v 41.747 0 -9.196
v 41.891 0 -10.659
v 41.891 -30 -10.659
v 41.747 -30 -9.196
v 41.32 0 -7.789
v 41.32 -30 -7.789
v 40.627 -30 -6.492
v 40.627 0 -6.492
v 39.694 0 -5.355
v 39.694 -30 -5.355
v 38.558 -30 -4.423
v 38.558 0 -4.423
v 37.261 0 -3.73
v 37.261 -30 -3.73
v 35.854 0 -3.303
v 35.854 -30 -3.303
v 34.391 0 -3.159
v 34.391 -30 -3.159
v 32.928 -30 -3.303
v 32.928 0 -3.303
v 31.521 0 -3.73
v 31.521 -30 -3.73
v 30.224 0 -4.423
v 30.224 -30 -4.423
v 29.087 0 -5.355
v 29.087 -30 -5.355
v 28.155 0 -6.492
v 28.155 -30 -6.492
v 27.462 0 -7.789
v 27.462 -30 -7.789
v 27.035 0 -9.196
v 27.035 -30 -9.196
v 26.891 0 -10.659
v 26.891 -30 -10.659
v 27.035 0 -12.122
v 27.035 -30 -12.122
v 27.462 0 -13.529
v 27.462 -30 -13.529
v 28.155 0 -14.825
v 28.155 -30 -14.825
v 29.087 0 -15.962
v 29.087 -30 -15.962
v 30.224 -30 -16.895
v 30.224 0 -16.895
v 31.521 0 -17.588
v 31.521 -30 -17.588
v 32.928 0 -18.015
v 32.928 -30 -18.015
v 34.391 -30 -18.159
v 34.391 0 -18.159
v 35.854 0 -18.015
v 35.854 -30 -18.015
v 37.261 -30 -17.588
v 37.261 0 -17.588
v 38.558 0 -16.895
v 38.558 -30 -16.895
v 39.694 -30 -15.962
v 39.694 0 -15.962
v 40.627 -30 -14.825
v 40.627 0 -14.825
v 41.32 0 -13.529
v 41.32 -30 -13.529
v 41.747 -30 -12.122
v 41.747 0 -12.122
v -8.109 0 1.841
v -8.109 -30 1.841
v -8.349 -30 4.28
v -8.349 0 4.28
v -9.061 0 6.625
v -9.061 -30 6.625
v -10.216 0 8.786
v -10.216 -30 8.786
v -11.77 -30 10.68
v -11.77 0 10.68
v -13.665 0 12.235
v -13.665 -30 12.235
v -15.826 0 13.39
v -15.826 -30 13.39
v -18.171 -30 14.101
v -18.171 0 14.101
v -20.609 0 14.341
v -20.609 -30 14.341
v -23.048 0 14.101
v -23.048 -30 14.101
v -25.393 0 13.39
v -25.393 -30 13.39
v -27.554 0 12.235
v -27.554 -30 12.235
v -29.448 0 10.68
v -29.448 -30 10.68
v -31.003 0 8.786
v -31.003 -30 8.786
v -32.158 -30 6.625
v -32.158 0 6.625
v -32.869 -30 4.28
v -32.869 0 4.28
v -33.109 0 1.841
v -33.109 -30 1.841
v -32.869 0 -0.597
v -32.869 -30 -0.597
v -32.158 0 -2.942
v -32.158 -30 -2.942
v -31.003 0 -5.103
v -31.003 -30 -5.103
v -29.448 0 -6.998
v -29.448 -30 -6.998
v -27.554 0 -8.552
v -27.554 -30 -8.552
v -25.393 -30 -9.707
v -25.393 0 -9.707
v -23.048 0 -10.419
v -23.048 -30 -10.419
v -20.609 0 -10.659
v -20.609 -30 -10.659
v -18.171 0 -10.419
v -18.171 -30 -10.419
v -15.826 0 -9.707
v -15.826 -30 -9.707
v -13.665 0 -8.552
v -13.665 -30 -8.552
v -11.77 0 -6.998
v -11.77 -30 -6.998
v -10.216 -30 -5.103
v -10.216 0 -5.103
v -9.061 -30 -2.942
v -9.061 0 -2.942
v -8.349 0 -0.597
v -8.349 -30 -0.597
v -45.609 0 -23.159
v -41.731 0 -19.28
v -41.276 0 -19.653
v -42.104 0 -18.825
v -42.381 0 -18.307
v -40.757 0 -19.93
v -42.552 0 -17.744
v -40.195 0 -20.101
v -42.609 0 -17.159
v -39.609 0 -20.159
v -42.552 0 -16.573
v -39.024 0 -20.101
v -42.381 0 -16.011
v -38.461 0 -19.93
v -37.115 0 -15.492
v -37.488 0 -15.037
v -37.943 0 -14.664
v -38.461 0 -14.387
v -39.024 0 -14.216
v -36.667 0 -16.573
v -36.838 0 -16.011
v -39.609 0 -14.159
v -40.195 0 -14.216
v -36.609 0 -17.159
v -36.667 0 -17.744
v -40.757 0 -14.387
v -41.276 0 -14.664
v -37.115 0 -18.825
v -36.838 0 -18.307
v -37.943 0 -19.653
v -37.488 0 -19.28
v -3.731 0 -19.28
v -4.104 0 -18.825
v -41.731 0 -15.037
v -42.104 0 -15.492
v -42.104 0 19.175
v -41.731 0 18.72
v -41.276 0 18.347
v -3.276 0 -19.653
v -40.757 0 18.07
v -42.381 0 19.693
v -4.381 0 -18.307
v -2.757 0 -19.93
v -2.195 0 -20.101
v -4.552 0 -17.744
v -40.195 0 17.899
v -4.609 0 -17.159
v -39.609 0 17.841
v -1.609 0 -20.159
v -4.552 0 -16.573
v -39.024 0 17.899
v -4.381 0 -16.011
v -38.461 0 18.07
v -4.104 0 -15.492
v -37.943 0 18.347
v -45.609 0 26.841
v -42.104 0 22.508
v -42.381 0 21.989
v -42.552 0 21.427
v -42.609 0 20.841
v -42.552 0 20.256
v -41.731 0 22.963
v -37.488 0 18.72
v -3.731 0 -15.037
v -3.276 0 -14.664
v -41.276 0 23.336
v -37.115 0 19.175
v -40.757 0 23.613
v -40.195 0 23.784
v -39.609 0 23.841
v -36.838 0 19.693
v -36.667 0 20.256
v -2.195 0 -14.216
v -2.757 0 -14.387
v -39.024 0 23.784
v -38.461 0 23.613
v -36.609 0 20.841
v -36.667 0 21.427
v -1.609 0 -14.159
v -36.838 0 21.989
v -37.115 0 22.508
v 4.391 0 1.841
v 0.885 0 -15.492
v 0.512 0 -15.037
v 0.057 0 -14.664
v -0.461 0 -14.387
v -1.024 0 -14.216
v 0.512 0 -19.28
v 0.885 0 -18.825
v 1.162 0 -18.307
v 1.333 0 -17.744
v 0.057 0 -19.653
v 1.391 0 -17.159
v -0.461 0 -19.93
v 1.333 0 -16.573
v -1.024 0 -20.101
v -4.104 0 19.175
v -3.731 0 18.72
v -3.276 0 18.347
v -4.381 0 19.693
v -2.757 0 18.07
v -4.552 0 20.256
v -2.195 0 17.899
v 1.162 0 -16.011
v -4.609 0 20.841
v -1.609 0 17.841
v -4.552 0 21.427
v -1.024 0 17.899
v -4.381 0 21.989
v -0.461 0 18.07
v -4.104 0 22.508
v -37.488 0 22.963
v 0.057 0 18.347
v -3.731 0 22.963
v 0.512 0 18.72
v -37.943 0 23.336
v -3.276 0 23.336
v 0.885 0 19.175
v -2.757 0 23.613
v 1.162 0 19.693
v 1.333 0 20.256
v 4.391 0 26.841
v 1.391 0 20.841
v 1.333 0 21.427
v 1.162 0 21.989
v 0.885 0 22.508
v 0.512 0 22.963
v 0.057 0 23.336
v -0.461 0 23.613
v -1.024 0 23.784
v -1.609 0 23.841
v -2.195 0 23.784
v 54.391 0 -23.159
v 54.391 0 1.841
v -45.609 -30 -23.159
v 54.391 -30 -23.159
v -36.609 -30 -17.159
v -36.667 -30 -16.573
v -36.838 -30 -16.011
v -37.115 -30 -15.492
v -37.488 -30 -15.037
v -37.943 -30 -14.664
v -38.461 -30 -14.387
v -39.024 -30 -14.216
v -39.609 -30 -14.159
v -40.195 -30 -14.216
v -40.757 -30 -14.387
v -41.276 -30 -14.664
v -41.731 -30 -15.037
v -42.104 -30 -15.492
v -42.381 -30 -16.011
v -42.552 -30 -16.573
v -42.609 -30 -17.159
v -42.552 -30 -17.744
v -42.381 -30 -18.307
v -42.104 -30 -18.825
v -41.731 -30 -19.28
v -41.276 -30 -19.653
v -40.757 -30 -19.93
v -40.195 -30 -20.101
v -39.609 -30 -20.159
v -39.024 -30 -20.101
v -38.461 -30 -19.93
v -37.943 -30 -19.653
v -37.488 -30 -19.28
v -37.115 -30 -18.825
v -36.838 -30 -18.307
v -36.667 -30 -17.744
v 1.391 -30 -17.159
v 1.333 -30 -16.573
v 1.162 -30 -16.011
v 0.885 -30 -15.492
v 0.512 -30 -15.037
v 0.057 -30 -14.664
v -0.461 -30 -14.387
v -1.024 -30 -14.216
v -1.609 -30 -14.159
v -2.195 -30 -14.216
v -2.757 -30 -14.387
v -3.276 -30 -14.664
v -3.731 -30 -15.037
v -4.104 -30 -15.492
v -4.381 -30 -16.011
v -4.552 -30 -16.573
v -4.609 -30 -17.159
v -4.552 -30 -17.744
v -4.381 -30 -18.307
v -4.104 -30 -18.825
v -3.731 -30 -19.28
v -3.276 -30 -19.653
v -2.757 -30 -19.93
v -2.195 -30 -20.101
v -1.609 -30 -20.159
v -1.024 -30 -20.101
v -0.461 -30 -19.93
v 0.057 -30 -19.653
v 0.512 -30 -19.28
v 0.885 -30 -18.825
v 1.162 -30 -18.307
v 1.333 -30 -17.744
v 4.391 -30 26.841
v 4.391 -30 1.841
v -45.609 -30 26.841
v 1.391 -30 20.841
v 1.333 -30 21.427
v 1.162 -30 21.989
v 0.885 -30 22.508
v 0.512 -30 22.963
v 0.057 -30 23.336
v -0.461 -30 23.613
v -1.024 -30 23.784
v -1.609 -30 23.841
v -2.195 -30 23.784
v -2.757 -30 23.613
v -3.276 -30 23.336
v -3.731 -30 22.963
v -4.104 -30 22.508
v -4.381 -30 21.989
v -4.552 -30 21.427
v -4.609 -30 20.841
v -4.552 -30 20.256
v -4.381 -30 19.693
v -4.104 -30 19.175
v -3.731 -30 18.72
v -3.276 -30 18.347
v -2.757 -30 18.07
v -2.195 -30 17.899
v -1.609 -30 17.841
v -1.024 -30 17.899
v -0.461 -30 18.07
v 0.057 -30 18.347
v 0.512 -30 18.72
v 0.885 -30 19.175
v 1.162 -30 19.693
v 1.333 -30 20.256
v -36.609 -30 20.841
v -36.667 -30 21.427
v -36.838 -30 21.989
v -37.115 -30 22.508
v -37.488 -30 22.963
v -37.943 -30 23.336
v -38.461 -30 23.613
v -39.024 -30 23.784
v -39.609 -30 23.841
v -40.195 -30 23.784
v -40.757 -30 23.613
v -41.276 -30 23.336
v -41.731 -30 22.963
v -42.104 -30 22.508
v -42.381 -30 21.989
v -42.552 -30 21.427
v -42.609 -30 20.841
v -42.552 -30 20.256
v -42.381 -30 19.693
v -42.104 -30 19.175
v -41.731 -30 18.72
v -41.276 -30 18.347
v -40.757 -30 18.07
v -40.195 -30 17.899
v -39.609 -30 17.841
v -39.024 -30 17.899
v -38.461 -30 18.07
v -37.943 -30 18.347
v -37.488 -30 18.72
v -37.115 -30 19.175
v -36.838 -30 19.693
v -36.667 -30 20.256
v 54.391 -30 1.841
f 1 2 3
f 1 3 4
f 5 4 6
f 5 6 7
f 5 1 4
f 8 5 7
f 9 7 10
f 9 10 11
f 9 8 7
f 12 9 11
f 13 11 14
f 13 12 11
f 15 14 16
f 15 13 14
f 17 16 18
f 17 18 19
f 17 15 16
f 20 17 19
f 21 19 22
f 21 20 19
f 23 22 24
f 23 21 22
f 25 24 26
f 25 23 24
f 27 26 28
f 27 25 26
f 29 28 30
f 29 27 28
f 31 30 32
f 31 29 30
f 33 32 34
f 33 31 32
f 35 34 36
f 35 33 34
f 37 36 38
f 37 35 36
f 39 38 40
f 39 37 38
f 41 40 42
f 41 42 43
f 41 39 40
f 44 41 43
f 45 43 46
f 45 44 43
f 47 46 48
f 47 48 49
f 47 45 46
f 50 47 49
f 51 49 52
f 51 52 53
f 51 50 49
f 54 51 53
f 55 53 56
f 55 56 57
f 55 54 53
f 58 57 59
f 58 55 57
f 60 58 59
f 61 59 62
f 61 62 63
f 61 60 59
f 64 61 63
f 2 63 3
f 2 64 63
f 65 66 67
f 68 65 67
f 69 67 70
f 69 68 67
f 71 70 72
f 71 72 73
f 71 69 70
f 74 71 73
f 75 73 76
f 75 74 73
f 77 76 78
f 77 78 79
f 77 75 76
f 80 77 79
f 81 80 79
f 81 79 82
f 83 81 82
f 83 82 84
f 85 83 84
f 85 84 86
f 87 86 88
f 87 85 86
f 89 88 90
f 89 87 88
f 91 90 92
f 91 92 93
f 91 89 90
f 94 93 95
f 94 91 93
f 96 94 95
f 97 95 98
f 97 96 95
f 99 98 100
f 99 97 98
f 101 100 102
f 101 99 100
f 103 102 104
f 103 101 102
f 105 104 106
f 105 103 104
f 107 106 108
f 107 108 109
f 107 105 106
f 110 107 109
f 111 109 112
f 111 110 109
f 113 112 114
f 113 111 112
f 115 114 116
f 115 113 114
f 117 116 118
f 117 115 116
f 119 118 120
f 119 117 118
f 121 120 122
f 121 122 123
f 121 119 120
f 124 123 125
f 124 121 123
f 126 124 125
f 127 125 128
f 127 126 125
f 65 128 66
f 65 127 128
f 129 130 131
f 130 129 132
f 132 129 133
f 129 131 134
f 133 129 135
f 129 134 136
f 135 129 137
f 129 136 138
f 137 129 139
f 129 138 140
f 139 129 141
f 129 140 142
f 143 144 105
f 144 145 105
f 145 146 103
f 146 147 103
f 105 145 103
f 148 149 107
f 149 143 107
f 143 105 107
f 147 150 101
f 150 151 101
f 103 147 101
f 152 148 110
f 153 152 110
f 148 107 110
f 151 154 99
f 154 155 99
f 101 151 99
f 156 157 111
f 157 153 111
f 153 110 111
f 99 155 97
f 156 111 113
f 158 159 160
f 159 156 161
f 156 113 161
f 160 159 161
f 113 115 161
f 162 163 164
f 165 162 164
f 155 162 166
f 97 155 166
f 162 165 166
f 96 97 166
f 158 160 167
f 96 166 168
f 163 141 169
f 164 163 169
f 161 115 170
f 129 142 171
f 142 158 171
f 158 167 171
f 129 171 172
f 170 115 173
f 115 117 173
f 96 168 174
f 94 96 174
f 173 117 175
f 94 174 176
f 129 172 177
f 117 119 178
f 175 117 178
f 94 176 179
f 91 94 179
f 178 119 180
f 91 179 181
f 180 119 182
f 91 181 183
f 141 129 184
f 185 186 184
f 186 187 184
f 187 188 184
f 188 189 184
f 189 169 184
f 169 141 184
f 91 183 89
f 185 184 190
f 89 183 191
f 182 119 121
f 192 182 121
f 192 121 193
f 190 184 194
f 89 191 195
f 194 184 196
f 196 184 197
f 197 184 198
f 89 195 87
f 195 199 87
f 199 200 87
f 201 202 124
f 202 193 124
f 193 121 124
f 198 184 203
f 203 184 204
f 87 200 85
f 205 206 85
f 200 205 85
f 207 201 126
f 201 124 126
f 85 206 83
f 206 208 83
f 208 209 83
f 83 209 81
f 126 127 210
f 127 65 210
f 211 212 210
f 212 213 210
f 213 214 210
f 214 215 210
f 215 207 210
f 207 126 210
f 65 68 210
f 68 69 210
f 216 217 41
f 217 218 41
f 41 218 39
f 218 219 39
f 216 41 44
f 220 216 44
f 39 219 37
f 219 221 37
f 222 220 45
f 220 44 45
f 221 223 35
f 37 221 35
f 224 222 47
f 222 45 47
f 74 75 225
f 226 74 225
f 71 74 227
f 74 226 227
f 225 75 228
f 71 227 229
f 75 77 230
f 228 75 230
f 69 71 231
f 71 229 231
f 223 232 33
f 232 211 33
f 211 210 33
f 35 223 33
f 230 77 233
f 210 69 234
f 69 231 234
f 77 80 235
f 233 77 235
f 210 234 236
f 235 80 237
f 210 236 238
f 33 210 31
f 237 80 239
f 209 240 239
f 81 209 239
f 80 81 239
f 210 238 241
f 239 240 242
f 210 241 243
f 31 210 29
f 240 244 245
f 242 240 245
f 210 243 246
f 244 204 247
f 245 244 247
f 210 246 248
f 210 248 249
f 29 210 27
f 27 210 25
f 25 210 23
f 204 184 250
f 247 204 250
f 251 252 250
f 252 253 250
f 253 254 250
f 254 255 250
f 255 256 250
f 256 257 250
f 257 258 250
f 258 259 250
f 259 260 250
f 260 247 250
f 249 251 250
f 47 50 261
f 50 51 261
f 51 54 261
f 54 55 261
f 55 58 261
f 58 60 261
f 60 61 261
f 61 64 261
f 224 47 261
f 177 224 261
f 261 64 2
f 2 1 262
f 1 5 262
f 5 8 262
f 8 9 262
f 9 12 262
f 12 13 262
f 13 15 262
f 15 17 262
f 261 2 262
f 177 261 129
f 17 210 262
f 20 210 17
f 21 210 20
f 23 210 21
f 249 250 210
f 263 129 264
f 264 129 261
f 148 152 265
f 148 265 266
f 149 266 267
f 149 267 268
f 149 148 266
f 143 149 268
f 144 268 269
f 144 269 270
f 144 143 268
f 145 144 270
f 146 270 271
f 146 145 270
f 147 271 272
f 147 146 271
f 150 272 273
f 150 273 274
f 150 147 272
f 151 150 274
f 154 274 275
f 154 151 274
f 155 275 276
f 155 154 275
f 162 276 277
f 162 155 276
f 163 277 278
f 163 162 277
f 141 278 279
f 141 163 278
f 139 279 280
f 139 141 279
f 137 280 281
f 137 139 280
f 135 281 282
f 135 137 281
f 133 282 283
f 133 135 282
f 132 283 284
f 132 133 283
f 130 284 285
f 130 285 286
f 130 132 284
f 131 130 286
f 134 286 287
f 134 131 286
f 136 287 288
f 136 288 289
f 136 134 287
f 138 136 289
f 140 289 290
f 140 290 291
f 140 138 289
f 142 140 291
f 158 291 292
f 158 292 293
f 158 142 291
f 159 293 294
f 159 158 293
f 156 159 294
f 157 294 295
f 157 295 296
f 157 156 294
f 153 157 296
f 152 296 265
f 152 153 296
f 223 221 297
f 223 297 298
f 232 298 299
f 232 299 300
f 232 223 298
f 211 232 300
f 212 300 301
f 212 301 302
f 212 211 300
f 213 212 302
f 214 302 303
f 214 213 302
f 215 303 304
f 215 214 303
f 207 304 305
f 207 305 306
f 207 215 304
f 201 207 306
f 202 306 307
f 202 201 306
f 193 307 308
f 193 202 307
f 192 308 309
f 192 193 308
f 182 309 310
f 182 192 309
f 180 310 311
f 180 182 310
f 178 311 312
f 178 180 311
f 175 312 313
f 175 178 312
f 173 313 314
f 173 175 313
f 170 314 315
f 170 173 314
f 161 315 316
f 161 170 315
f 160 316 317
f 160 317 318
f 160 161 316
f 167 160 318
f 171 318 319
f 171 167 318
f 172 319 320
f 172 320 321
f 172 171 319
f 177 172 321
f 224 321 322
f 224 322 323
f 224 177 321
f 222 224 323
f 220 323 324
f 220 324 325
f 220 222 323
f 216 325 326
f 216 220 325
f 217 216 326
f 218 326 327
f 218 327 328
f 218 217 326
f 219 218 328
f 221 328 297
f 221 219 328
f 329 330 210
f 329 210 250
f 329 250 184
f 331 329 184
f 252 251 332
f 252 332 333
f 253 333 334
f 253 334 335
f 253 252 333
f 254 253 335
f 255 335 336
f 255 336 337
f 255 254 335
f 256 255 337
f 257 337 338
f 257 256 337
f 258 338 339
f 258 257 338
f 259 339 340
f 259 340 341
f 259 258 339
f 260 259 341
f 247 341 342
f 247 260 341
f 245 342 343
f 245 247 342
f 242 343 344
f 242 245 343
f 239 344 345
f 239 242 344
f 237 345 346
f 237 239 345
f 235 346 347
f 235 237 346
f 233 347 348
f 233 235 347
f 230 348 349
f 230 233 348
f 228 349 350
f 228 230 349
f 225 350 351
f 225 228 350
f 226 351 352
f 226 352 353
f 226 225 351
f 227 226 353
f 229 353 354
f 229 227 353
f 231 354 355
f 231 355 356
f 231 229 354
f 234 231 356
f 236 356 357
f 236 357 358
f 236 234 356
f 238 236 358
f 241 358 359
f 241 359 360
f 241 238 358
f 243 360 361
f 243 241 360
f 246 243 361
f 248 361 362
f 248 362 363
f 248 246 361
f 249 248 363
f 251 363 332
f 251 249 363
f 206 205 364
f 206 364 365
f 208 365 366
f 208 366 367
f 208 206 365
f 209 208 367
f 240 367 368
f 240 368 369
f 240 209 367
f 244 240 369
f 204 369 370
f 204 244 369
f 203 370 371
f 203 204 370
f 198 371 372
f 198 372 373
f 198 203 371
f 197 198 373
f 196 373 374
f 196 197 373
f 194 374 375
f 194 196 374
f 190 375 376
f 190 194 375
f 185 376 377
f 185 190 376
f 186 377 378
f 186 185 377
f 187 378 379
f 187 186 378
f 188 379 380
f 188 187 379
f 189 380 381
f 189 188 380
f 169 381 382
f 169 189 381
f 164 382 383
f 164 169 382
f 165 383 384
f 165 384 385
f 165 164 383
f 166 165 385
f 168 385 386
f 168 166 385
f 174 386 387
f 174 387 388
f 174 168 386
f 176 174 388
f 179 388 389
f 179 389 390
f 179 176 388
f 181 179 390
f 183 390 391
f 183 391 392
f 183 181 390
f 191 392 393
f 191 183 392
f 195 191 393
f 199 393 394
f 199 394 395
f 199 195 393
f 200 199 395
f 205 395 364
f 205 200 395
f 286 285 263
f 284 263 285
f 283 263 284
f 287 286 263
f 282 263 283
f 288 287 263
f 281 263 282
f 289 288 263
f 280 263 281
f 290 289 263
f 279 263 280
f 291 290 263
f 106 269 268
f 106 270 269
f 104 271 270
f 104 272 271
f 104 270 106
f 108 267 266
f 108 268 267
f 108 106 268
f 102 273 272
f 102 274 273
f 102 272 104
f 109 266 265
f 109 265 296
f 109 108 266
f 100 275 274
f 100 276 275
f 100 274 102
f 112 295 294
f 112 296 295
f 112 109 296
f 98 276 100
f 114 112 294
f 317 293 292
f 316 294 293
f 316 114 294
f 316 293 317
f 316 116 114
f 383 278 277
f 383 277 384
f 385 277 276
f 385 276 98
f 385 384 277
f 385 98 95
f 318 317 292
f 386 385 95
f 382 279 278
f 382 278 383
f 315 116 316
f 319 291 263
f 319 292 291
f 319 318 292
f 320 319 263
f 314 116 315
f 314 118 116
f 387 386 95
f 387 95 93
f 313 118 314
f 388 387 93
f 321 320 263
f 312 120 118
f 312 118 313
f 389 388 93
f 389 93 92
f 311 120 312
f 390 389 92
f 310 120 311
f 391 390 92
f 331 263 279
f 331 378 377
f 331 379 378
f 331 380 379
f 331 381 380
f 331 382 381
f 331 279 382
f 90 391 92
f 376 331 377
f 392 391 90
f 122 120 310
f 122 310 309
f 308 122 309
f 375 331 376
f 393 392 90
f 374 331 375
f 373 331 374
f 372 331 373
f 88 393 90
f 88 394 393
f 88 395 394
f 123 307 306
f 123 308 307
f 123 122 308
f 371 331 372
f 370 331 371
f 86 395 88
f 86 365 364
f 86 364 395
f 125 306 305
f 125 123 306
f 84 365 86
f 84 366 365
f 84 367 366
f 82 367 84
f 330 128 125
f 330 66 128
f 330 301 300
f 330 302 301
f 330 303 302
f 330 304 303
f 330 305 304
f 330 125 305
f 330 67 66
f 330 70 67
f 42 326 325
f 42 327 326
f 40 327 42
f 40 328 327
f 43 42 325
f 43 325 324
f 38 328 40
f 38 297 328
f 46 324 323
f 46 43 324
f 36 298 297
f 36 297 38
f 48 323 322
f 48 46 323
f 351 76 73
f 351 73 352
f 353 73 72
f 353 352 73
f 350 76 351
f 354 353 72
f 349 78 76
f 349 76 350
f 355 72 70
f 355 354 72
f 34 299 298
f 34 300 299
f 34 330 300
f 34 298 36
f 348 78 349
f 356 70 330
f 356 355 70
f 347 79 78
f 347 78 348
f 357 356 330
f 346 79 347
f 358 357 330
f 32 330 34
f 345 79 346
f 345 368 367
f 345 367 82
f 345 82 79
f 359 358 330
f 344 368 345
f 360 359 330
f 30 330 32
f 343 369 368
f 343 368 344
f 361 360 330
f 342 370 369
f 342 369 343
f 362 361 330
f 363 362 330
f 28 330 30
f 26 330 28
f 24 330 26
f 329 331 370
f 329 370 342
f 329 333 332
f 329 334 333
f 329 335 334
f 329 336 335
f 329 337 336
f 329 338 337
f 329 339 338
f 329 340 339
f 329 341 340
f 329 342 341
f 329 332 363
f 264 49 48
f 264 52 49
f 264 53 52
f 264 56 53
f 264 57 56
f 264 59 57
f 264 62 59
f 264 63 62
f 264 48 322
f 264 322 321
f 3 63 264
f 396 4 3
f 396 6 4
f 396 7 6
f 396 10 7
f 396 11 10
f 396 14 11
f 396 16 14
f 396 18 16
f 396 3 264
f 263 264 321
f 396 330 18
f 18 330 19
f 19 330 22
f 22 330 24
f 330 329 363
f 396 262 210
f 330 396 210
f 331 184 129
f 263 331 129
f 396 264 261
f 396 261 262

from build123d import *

# Parameters (mm, degrees)
F0_R     = 3
F0_R_2   = 12.5
F0_R_3   = 7.5
F1_DEPTH = 30


with BuildPart() as f1:
    # F0 (on Front) → F1 (new body)
    with BuildSketch(Plane.XZ):
        Polygon((4.39074, 26.841277), (-45.60926, 26.841277), (-45.60926, -23.158723), (54.39074, -23.158723), (54.39074, 1.841277), (4.39074, 1.841277), align=None)
        with Locations((-39.60926, -17.158723)):
            Circle(F0_R, mode=Mode.SUBTRACT)
        with Locations((-1.60926, -17.158723)):
            Circle(F0_R, mode=Mode.SUBTRACT)
        with Locations((-20.60926, 1.841277)):
            Circle(F0_R_2, mode=Mode.SUBTRACT)
        with Locations((34.39074, -10.658723)):
            Circle(F0_R_3, mode=Mode.SUBTRACT)
        with Locations((-39.60926, 20.841277)):
            Circle(F0_R, mode=Mode.SUBTRACT)
        with Locations((-1.60926, 20.841277)):
            Circle(F0_R, mode=Mode.SUBTRACT)
    extrude(amount=F1_DEPTH)


solid = f1.part
